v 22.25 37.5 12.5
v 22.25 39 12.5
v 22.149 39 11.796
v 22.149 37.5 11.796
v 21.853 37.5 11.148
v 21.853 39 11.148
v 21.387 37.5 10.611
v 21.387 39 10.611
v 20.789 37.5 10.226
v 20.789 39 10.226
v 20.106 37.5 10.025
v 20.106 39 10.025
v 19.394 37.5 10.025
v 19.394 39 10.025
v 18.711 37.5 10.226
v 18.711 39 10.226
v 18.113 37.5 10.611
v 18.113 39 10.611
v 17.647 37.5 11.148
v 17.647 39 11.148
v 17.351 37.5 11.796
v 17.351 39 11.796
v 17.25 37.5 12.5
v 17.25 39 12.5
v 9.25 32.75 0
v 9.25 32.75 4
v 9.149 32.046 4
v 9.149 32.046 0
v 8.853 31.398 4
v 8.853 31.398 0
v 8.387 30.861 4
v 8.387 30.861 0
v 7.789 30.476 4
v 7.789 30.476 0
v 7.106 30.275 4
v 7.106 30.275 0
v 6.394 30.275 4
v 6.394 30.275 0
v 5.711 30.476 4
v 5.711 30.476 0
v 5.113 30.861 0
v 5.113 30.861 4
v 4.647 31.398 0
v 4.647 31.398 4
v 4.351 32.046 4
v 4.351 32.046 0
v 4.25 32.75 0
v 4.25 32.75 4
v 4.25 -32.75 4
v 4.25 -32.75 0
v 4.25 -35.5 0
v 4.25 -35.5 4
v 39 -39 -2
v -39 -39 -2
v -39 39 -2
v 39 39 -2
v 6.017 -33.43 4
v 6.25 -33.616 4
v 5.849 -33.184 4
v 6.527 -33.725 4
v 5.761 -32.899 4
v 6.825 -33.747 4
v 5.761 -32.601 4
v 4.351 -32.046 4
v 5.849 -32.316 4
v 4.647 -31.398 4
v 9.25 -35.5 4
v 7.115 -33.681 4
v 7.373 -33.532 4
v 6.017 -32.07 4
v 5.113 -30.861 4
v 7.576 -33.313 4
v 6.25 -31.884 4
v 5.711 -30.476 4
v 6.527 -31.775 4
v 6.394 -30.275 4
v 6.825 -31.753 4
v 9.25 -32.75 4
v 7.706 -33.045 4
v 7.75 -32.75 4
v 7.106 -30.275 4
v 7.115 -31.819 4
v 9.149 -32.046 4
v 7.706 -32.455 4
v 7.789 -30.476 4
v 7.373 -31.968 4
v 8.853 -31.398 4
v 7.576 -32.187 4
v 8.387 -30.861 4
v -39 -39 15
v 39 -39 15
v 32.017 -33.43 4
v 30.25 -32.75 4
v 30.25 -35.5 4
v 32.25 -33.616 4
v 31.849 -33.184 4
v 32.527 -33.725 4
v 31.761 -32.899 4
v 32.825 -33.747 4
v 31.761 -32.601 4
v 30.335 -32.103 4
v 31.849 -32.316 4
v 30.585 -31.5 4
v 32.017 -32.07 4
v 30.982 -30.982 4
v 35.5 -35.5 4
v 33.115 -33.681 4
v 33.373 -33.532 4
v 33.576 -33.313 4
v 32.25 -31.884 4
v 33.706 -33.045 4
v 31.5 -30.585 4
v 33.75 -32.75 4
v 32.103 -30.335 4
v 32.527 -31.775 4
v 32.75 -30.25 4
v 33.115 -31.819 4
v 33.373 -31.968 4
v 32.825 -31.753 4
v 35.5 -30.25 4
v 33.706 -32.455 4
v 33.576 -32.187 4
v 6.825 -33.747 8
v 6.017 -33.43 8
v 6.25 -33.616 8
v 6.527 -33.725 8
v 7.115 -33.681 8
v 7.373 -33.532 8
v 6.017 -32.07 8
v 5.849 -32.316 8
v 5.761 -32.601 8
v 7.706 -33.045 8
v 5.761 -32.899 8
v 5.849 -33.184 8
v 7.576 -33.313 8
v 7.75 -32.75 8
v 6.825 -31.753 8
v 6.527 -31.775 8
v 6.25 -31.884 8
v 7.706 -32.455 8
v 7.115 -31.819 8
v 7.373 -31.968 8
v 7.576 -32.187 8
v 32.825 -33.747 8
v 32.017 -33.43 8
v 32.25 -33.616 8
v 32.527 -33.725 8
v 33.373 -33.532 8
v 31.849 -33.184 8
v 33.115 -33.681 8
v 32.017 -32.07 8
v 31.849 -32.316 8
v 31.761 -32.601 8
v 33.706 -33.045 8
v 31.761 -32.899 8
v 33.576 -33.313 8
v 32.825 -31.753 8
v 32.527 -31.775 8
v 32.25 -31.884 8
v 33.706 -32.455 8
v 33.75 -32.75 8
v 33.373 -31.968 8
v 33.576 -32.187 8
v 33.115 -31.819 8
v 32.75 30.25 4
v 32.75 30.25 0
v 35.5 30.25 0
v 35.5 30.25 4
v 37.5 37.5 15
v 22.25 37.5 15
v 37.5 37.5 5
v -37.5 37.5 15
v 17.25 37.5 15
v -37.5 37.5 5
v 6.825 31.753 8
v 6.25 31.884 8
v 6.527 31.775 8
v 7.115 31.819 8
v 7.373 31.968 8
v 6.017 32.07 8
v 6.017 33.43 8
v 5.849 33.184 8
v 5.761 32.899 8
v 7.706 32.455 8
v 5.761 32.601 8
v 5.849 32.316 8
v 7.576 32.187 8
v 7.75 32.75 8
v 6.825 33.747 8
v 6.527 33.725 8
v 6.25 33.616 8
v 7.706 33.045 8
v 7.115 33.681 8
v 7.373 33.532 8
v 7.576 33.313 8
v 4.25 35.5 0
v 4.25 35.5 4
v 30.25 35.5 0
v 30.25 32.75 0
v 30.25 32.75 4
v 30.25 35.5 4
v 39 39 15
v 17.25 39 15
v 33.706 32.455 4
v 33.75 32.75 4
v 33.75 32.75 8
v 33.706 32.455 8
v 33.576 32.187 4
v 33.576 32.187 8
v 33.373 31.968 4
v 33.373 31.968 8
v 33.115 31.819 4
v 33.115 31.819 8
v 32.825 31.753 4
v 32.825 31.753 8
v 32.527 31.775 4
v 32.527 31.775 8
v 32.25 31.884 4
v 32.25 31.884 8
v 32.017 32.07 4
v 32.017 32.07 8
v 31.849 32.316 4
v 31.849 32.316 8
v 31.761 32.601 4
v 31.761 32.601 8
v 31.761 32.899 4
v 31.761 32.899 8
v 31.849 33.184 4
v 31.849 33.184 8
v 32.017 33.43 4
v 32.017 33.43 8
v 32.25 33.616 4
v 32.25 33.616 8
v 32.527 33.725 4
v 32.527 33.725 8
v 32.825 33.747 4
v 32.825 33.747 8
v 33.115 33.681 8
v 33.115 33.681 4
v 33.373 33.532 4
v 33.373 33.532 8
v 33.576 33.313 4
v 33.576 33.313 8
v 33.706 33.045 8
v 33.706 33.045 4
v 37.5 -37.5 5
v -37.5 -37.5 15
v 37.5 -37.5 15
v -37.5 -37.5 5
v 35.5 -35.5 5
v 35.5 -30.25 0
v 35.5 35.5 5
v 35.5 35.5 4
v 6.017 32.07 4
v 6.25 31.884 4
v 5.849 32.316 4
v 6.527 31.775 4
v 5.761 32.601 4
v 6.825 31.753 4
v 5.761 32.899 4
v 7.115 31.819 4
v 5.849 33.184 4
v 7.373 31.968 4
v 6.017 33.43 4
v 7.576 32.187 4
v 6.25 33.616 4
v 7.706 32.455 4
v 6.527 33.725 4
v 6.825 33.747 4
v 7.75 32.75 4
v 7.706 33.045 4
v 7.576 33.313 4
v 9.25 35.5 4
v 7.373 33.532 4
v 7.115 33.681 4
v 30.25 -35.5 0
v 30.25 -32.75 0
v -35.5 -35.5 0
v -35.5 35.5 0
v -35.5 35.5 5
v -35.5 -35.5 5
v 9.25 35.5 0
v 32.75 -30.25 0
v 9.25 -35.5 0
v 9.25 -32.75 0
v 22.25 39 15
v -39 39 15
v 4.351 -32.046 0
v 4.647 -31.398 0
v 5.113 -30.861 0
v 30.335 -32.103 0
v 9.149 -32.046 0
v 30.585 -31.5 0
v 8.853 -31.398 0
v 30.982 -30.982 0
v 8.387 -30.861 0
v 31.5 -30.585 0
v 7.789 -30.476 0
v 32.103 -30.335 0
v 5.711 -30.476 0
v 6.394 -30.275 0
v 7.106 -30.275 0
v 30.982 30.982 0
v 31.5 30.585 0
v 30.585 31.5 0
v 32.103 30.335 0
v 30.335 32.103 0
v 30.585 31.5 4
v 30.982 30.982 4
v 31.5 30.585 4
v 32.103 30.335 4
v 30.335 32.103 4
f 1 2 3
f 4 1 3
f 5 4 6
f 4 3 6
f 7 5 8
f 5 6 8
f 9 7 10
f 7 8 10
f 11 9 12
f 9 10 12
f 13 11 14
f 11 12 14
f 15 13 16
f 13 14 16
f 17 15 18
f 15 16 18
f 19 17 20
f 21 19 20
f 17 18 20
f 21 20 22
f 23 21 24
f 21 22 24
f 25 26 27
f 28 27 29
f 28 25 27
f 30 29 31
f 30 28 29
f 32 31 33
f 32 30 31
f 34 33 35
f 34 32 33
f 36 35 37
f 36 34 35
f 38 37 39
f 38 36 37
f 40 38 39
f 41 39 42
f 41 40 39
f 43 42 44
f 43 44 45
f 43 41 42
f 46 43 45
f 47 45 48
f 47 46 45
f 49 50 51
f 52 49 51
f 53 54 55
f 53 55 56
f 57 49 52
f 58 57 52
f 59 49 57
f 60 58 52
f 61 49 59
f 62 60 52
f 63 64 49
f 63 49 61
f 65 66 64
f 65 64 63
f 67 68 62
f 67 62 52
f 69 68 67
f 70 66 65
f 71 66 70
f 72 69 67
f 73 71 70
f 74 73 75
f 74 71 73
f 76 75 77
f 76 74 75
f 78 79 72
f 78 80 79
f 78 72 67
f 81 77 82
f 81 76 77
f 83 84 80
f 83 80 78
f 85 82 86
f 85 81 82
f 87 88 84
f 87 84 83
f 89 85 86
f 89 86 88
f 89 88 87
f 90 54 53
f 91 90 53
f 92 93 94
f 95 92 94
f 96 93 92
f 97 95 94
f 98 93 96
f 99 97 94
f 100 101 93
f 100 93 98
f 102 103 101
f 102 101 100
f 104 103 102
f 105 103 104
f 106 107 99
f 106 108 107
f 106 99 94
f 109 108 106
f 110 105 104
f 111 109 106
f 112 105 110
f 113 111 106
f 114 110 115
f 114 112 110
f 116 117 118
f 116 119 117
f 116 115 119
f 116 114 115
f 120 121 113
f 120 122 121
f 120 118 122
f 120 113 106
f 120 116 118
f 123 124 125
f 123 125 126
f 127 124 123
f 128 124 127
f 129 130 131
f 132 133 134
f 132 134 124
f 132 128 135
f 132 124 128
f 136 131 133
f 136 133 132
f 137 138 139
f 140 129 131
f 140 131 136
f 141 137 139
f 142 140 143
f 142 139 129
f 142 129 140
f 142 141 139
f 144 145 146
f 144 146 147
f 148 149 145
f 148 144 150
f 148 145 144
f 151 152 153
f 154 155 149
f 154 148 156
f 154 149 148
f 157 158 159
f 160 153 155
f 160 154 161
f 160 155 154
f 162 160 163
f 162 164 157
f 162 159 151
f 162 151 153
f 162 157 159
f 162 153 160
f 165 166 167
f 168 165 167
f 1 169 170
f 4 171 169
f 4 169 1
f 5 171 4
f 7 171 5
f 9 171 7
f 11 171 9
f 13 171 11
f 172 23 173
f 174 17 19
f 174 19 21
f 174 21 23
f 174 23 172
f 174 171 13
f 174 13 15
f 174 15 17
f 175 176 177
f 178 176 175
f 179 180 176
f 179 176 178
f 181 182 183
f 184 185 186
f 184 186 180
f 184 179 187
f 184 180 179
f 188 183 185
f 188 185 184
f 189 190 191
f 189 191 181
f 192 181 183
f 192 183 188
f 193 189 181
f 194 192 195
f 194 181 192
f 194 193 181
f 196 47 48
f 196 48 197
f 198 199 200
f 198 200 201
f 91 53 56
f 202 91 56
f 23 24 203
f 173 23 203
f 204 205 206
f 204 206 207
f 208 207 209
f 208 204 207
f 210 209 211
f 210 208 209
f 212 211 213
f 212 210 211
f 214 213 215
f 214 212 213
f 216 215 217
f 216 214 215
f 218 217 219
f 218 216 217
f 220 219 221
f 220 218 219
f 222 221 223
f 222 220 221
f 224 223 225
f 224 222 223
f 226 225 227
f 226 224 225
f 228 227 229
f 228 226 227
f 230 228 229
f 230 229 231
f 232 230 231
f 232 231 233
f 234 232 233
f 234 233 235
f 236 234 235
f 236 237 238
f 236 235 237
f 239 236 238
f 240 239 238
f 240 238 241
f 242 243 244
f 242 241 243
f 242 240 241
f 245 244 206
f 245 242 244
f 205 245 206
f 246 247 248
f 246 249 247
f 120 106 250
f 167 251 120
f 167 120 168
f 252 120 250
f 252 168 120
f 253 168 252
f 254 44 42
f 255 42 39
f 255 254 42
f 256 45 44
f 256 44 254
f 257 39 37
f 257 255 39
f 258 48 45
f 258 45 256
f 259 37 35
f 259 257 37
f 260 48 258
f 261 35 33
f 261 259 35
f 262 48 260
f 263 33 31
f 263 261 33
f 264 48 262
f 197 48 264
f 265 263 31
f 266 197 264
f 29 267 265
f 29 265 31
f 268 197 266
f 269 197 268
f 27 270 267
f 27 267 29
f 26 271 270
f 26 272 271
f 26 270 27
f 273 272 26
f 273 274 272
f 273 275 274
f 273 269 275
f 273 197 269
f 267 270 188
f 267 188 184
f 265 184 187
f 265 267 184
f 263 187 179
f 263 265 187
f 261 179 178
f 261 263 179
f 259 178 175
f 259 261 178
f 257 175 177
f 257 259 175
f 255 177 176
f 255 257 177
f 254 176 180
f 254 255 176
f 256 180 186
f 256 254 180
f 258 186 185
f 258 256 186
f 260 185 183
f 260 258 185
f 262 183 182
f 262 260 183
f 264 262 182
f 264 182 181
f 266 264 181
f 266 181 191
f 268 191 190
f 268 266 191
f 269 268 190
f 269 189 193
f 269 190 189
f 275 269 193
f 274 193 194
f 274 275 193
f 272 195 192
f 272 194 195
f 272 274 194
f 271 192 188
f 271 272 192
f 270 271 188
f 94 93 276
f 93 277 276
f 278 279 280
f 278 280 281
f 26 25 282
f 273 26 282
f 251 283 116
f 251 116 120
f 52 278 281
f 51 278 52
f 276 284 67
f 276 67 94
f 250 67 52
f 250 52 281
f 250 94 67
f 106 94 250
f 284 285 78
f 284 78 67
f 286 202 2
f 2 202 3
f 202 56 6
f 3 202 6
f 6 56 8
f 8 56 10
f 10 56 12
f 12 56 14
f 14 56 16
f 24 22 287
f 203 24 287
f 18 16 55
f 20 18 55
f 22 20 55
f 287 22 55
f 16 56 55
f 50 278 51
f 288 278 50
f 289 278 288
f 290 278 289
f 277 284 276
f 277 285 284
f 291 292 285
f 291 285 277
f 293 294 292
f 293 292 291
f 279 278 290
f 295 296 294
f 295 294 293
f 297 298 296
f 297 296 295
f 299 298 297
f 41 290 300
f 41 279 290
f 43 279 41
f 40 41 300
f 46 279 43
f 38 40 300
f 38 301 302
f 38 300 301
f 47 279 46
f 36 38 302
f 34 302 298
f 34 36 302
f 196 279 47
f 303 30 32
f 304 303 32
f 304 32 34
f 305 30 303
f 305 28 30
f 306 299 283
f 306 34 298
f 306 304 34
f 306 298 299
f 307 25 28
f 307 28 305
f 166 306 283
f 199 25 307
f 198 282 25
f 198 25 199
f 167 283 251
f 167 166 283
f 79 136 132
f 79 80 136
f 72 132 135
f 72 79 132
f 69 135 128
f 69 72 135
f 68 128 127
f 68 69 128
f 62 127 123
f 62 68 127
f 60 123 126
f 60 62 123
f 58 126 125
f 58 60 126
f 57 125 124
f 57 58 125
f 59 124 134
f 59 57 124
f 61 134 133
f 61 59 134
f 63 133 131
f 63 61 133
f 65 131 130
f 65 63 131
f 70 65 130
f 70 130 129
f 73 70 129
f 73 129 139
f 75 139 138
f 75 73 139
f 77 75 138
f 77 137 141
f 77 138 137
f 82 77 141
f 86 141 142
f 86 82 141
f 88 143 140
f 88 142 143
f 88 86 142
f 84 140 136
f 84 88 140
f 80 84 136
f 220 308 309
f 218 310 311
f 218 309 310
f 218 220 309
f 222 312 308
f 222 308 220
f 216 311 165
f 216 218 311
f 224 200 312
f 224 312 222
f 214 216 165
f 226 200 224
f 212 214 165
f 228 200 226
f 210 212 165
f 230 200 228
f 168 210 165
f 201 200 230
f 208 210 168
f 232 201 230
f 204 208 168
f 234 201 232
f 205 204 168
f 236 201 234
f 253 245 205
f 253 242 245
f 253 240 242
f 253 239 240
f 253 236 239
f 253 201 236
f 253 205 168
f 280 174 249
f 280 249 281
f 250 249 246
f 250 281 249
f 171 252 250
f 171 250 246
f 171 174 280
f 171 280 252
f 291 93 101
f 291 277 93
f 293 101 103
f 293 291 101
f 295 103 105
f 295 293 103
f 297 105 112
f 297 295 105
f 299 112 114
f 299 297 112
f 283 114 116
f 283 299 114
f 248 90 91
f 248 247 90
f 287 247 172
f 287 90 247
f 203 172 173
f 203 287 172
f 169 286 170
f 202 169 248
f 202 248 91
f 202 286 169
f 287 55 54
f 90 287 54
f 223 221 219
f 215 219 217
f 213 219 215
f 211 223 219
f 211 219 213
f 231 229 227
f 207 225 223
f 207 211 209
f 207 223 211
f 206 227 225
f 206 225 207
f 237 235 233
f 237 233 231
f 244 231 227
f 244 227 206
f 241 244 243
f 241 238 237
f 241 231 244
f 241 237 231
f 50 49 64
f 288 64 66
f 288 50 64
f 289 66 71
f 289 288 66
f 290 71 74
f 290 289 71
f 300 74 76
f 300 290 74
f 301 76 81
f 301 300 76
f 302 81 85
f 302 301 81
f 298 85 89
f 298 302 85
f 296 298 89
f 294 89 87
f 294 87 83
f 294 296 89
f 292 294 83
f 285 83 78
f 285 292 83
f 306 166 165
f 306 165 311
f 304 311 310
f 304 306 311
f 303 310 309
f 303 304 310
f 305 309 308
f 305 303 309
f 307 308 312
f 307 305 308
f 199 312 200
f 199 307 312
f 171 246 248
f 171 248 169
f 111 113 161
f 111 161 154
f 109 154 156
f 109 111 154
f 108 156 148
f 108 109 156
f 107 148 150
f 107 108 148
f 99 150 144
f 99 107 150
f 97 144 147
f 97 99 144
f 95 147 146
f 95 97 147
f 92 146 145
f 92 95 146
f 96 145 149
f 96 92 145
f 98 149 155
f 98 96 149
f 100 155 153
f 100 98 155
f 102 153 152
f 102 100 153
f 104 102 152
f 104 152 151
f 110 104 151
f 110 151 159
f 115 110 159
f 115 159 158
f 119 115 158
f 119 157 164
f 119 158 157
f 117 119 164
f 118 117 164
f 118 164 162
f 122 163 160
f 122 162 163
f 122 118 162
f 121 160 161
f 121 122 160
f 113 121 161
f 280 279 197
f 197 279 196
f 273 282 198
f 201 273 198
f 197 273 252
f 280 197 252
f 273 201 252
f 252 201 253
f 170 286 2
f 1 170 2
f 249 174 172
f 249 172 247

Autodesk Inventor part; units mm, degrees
ref_plane "YZ Plane" through (0, 0, 0) normal (1, 0, 0) x (0, 1, 0)
ref_plane "XZ Plane" through (0, 0, 0) normal (0, 1, 0) x (-1, 0, 0)
ref_plane "XY Plane" through (0, 0, 0) normal (0, 0, 1) x (1, 0, 0)
sketch "USB_Micro" plane through (0, 0, 0) normal (0, 0, 1) x (1, 0, 0)
  line L0 (-6.7, 3.4) -> (-6.7, 2.0438)
  line L1 (-7.2, 1.6938) -> (-6.7, 2.0438)
  line L2 (-7.2, 1.6938) -> (-7.2, 0.3)
  line L3 (-7.2, 0.3) -> (-0.3, 0.3)
  line L4 (-0.3, 0.3) -> (-0.3, 1.6938)
  line L5 (-0.8, 2.0438) -> (-0.3, 1.6938)
  line L6 (-6.7, 3.4) -> (-0.8, 3.4)
  line L7 (-0.8, 3.4) -> (-0.8, 2.0438)
  line L8 (-0.8, 0.8) -> (-6.7, 0.8)
  line L9 (-6.7, 0.8) -> (-6.7, 1.4335)
  line L10 (-6.7, 1.4335) -> (-6.2, 1.7835)
  line L11 (-6.2, 1.7835) -> (-6.2, 2.9)
  line L12 (-6.2, 2.9) -> (-1.3, 2.9)
  line L13 (-1.3, 2.9) -> (-1.3, 1.7835)
  line L14 (-1.3, 1.7835) -> (-0.8, 1.4335)
  line L15 (-0.8, 1.4335) -> (-0.8, 0.8)
  point P0 (-3.75, 0.3)
  dimension "d42" = 0.5
sketch "Skizze1" plane through (0, 0, 0) normal (0, 0, 1) x (1, 0, 0)
  line L0 (-39, -39) -> (39, -39)
  line L1 (39, -39) -> (39, 39)
  line L2 (39, 39) -> (-39, 39)
  line L3 (-39, 39) -> (-39, -39)
  line L4 (-39, -39) -> (39, 39) construction
  line L5 (39, -39) -> (-39, 39) construction
  line L6 (-37.5, -37.5) -> (37.5, -37.5)
  line L7 (37.5, -37.5) -> (37.5, 37.5)
  line L8 (37.5, 37.5) -> (-37.5, 37.5)
  line L9 (-37.5, 37.5) -> (-37.5, -37.5)
  line L10 (-37.5, -37.5) -> (37.5, 37.5) construction
  line L11 (37.5, -37.5) -> (-37.5, 37.5) construction
  line L12 (-37.5, 37.5) -> (-35.5, 37.5)
  line L13 (-35.5, 37.5) -> (-35.5, -37.5)
  line L14 (-35.5, -37.5) -> (-37.5, -37.5)
  line L15 (-37.5, -37.5) -> (-37.5, 37.5)
  line L16 (35.5, 37.5) -> (37.5, 37.5)
  line L17 (37.5, 37.5) -> (37.5, -37.5)
  line L18 (37.5, -37.5) -> (35.5, -37.5)
  line L19 (35.5, -37.5) -> (35.5, 37.5)
  line L20 (-35.5, -35.5) -> (35.5, -35.5)
  line L21 (35.5, -35.5) -> (35.5, -37.5)
  line L22 (35.5, -37.5) -> (-35.5, -37.5)
  line L23 (-35.5, -37.5) -> (-35.5, -35.5)
  line L24 (35.5, 37.5) -> (-35.5, 37.5)
  line L25 (-35.5, 37.5) -> (-35.5, 35.5)
  line L26 (-35.5, 35.5) -> (35.5, 35.5)
  line L27 (35.5, 35.5) -> (35.5, 37.5)
  point P0 (0, 0)
  dimension "d0" = 78
  dimension "d1" = 78
  dimension "d2" = 75
  dimension "d3" = 75
  dimension "d46" = 2
  dimension "d47" = 2
  dimension "d48" = 2
  dimension "d52" = 2
extrude "Extrusion1" add sketch "Skizze1" along normal blind 15
extrude "Extrusion9" add sketch "Skizze1" along normal blind 5 contours L9 L8 L13 L6 | L13 L20 L19 L6 | L19 L8 L7 L6 | L8 L19 L26 L13
extrude "Extrusion6" add sketch "Skizze1" against normal blind 2 contours L3 L2 L1 L0 | L9 L8 L13 L6 | L13 L20 L19 L6 | L19 L8 L7 L6 | L13 L26 L19 L20 | L8 L19 L26 L13
sketch "Skizze5" plane through (0, 0, 0) normal (0, 0, 1) x (1, 0, 0)
  circle A0 centre (32.75, -32.75) radius 1
  circle A1 centre (32.75, 32.75) radius 1
  circle A2 centre (6.75, -32.75) radius 1
  circle A3 centre (6.75, 32.75) radius 1
  circle A4 centre (32.75, 32.75) radius 2.5
  circle A5 centre (6.75, 32.75) radius 2.5
  circle A6 centre (32.75, -32.75) radius 2.5
  circle A7 centre (6.75, -32.75) radius 2.5
  line L0 (-54.6, 0) -> (54.6, 0) projected
  line L1 (0, -54.6) -> (0, 54.6) projected
  line L2 (35.5, 35.5) -> (35.5, -35.5) projected
  line L3 (-35.5, 35.5) -> (35.5, 35.5) projected
  line L4 (35.5, -35.5) -> (-35.5, -35.5) projected
  line L5 (9.25, 32.75) -> (9.25, 35.5)
  line L6 (4.25, 32.75) -> (4.25, 35.5)
  line L7 (4.25, 35.5) -> (9.25, 35.5)
  line L8 (30.25, 32.75) -> (30.25, 35.5)
  line L9 (30.25, 35.5) -> (35.5, 35.5)
  line L10 (32.75, 30.25) -> (35.5, 30.25)
  line L11 (35.5, 30.25) -> (35.5, 35.5)
  line L12 (32.75, -30.25) -> (35.5, -30.25)
  line L13 (35.5, -30.25) -> (35.5, -35.5)
  line L14 (30.25, -32.75) -> (30.25, -35.5)
  line L15 (30.25, -35.5) -> (35.5, -35.5)
  line L16 (9.25, -32.75) -> (9.25, -35.5)
  line L17 (4.25, -32.75) -> (4.25, -35.5)
  line L18 (4.25, -35.5) -> (9.25, -35.5)
  point P0 (0, 0)
  dimension "d28" = 2
  dimension "d33" = 5
  dimension "d34" = 65.5
  dimension "d35" = 26
  dimension "d36" = 32.75
  dimension "d37" = 32.75
  dimension "d51" = 32.75
extrude "Extrusion7" add sketch "Skizze5" along normal blind 4 contours A4 | A5 | A6 | A7
sketch "Skizze6" plane through (-39, 39, 15) normal (0, 1, 0) x (1, 0, 0)
  line L0 (63.71, 5.7) -> (56.21, 5.7) projected
  line L1 (63.71, 7.55) -> (63.71, 5.7) projected
  line L2 (63.71, 7.55) -> (63.21, 7.9) projected
  line L3 (63.21, 7.9) -> (63.21, 9.4) projected
  line L4 (56.71, 9.4) -> (63.21, 9.4) projected
  line L5 (56.71, 7.9) -> (56.71, 9.4) projected
  line L6 (56.21, 7.55) -> (56.71, 7.9) projected
  line L7 (56.21, 7.55) -> (56.21, 5.7) projected
  line L8 (56.51, 6) -> (63.41, 6) projected
  line L9 (56.51, 7.3938) -> (56.51, 6) projected
  line L10 (57.01, 7.7438) -> (56.51, 7.3938) projected
  line L11 (57.01, 9.1) -> (57.01, 7.7438) projected
  line L12 (62.91, 9.1) -> (57.01, 9.1) projected
  line L13 (62.91, 9.1) -> (62.91, 7.7438) projected
  line L14 (62.91, 7.7438) -> (63.41, 7.3938) projected
  line L15 (63.41, 7.3938) -> (63.41, 6) projected
  line L16 (64.46, 4.95) -> (55.46, 4.95)
  line L17 (55.46, 4.95) -> (55.46, 7.9405)
  line L18 (55.46, 7.9405) -> (55.96, 8.2905)
  line L19 (55.96, 8.2905) -> (55.96, 10.15)
  line L20 (55.96, 10.15) -> (63.96, 10.15)
  line L21 (63.96, 10.15) -> (63.96, 8.2905)
  line L22 (63.96, 8.2905) -> (64.46, 7.9405)
  line L23 (64.46, 7.9405) -> (64.46, 4.95)
  point P0 (39, 15)
  dimension "d45" = 0.75
extrude "Extrusion8" [suppressed]
extrude "Extrusion10" add sketch "Skizze5" along normal blind 8 contours A0 | A1 | A2 | A3
extrude "Extrusion11" add sketch "Skizze5" along normal up to surface (4 mm away) contours A4 L8 L3 L2 L10 | L5 A5 L6 L3 | L2 L4 L14 A6 L12 | L17 A7 L16 L4
sketch "Skizze7" plane through (-39, 39, 15) normal (0, 1, 0) x (1, 0, 0)
  line L0 (78, 0) -> (0, 0) projected
  line L1 (78, 17) -> (78, 0) projected
  line L2 (61.25, 0) -> (61.25, 2.5)
  line L3 (56.25, 2.5) -> (56.25, 0)
  line L4 (1.5, 0) -> (76.5, 0) projected
  line L5 (61.25, 0) -> (56.25, 0)
  arc A0 (61.25, 2.5) -> (56.25, 2.5) centre (58.75, 2.5) ccw
  point P0 (39, 15)
  dimension "d58" = 19.25
  dimension "d59" = 5
  dimension "d60" = 2.5
extrude "Extrusion12" cut sketch "Skizze7" against normal up to surface (1.5 mm away)
equation "\"d0\" = d1"
equation "\"d2\" = d3"
equation "\"d47\" = d46"
equation "\"d48\" = d46"
equation "\"d52\" = d46"
properties part number "Sensorlamp_Base_new"
